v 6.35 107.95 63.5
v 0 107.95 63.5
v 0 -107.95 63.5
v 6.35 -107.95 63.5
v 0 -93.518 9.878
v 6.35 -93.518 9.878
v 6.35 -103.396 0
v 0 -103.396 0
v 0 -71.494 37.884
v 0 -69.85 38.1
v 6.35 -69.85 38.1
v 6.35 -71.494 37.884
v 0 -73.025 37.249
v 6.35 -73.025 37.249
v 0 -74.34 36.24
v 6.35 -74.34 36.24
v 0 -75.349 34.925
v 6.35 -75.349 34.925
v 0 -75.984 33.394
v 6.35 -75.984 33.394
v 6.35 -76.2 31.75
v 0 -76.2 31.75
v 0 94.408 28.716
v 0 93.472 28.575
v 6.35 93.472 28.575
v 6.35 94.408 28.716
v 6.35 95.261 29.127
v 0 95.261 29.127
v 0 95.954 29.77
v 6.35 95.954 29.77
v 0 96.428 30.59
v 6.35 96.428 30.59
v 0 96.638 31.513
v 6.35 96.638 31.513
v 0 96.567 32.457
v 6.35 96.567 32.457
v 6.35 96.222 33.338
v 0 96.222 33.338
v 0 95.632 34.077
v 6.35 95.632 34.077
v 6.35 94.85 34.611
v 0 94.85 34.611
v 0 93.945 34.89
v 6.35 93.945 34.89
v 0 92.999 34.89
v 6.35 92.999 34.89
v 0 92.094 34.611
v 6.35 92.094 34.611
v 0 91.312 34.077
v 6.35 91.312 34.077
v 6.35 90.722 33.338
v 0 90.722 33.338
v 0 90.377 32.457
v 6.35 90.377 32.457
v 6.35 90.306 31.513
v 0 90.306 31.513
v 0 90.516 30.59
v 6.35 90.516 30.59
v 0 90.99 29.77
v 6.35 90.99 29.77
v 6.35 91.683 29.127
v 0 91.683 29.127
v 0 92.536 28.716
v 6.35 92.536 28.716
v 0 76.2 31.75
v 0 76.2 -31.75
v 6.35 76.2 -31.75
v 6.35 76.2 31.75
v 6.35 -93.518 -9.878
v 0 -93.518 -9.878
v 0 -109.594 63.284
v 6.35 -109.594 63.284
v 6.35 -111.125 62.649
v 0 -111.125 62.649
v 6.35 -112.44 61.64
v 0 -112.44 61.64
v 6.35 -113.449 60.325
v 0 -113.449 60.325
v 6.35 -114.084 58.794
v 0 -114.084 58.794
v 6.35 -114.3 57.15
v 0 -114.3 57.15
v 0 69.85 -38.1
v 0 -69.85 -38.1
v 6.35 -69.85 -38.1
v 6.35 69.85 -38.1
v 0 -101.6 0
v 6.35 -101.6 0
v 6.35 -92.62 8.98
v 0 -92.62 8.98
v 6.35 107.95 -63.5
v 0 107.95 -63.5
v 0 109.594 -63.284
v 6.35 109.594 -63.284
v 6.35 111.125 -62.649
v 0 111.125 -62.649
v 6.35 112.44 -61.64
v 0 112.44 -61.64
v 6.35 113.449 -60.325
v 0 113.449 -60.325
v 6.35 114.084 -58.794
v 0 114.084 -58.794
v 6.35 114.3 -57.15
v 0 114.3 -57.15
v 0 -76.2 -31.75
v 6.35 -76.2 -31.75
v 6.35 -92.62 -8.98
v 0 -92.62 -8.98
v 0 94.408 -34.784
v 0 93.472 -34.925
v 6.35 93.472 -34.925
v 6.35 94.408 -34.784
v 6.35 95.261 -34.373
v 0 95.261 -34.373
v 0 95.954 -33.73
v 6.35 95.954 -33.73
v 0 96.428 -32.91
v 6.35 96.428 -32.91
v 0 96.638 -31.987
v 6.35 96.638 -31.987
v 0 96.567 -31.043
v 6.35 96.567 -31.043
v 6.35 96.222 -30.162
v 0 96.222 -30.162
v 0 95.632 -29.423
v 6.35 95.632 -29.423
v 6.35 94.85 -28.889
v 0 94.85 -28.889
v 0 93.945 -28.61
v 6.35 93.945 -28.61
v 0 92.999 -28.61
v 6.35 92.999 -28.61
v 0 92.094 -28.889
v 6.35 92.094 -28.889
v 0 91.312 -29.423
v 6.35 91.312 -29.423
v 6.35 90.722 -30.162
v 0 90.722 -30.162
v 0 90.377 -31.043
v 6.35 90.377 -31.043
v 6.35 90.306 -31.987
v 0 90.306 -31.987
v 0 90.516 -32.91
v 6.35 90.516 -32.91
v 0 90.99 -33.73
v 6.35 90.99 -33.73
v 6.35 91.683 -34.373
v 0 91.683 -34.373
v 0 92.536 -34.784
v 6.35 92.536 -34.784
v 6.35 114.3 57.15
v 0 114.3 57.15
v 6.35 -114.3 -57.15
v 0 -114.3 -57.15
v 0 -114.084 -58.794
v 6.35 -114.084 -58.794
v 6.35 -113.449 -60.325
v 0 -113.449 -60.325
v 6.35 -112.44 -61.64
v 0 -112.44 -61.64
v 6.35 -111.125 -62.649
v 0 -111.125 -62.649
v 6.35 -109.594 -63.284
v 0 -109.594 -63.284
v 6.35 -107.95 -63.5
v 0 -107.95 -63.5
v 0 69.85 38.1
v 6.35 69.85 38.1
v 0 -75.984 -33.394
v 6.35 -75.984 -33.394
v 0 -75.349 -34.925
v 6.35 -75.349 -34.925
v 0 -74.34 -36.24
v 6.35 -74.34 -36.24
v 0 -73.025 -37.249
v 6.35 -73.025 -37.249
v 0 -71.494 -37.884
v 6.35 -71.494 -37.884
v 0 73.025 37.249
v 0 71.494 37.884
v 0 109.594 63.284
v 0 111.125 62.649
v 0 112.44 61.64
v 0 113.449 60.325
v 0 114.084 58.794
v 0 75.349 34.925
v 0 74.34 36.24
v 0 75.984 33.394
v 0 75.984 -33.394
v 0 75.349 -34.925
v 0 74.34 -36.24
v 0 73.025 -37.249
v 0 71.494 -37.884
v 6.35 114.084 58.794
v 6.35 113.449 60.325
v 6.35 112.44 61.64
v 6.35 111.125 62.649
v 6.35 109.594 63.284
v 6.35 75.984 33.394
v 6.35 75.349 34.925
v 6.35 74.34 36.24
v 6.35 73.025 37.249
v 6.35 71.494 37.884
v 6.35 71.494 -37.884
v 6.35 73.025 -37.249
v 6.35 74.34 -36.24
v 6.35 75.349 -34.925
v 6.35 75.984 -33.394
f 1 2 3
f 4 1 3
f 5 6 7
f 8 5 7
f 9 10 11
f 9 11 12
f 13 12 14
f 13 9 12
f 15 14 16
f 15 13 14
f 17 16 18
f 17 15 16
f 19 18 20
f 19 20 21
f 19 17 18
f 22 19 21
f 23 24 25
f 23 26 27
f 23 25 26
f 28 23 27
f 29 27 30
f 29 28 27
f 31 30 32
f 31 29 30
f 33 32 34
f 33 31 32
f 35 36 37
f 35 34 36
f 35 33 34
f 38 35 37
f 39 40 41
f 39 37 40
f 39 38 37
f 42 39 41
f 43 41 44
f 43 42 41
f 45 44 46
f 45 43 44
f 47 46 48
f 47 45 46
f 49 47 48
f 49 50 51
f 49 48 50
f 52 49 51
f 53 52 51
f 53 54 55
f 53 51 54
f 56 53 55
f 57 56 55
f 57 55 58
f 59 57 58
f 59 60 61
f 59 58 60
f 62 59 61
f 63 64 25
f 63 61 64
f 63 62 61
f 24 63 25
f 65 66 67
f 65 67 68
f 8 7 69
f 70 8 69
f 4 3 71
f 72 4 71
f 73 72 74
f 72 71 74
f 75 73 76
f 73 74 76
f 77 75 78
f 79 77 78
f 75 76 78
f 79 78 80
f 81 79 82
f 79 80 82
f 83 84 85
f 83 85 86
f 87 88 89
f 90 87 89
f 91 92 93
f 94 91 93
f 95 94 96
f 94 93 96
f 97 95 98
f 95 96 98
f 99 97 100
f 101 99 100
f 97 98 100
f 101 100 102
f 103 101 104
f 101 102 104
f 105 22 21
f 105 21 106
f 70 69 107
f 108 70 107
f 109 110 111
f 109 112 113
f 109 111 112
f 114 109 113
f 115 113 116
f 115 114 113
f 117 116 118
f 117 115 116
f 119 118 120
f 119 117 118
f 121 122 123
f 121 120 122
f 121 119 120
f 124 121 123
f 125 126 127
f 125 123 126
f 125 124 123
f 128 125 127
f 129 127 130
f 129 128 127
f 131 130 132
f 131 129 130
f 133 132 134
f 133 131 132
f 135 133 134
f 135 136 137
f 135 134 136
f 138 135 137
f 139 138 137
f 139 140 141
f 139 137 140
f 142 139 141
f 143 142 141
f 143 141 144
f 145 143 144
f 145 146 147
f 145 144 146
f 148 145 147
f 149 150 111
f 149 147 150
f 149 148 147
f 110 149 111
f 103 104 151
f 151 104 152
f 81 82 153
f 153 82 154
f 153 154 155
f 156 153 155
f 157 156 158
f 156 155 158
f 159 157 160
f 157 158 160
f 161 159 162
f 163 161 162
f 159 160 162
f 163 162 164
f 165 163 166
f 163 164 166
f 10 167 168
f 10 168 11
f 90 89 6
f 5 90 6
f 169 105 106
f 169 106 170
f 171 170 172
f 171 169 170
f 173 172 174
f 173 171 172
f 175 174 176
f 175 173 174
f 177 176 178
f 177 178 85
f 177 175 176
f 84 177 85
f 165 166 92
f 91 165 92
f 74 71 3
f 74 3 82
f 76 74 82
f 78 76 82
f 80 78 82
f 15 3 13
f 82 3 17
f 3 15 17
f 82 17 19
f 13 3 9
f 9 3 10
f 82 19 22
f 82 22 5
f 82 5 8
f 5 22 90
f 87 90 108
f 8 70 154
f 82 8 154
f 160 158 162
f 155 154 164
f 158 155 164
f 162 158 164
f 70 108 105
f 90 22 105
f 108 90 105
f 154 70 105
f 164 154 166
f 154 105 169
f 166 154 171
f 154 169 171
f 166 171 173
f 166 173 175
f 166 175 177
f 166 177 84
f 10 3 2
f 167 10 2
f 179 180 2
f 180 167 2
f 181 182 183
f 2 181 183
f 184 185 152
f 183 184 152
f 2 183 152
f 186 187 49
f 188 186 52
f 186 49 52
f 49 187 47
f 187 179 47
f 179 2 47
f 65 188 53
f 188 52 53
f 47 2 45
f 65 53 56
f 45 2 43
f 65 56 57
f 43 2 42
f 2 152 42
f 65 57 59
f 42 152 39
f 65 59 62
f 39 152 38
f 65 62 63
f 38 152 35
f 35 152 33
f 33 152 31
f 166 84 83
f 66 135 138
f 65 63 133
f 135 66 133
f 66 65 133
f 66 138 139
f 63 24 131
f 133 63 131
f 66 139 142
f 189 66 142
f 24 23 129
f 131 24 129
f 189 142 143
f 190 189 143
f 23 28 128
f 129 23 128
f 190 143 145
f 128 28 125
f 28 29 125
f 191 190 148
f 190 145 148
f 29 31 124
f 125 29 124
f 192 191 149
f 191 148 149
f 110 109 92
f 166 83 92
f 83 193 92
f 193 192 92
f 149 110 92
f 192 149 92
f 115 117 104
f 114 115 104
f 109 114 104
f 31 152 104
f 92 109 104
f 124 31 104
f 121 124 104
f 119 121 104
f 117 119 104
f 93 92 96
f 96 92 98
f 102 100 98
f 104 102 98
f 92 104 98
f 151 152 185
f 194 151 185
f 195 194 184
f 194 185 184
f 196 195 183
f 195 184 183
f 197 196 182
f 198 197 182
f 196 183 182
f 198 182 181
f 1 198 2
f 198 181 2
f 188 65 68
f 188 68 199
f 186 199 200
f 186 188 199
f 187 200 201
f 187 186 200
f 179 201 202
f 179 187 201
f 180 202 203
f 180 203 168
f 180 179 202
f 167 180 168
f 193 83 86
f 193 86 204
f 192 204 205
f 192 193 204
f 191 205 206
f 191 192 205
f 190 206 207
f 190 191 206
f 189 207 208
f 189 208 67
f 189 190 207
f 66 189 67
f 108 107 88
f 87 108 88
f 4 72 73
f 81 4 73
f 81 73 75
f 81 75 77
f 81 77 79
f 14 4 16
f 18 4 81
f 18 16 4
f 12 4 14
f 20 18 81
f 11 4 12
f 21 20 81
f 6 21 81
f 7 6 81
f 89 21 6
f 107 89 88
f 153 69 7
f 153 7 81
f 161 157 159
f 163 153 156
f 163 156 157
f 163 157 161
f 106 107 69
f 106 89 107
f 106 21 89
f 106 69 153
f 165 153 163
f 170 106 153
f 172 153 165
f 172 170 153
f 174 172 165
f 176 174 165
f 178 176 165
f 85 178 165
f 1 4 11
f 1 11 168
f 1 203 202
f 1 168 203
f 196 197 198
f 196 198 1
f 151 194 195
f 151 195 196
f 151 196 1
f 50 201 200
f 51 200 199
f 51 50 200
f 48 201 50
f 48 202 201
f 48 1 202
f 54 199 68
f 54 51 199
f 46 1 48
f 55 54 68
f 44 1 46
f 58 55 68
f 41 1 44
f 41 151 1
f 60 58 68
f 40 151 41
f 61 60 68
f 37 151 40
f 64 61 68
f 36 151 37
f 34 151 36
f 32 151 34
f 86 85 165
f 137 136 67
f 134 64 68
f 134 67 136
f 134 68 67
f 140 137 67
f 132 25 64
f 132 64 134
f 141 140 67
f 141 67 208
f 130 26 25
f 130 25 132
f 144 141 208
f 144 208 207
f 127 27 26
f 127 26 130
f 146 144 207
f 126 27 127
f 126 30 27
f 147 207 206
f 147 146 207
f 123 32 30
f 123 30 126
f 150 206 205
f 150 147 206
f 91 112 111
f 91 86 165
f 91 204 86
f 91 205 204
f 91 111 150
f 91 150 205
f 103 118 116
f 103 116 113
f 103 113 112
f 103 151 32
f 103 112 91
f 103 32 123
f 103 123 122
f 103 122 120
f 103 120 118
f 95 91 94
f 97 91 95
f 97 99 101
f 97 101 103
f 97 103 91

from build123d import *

# Parameters (mm, degrees)
BOSS_EXTRUDE2_DEPTH     = 6.35
CUT_EXTRUDE1_REACH      = 132.909
CUT_EXTRUDE2_DEPTH      = 131.908603613
CUT_EXTRUDE2_DEPTH_BACK = 131.908603613
SKETCH5_R               = 3.175


with BuildPart() as part:
    # Sketch3 → Boss-Extrude2 (new body)
    with BuildSketch(Plane(origin=(0, 0, 0), x_dir=(0, 0, -1), z_dir=(1, 0, 0))):
        with BuildLine():
            Line((-57.15, -114.3), (57.15, -114.3))
            ThreePointArc((57.15, -114.3), (61.640128061, -112.440128061), (63.5, -107.95))
            Line((63.5, -107.95), (63.5, 107.95))
            ThreePointArc((63.5, 107.95), (61.640128061, 112.440128061), (57.15, 114.3))
            Line((57.15, 114.3), (-57.15, 114.3))
            ThreePointArc((-57.15, 114.3), (-61.640128061, 112.440128061), (-63.5, 107.95))
            Line((-63.5, 107.95), (-63.5, -107.95))
            ThreePointArc((-63.5, -107.95), (-61.640128061, -112.440128061), (-57.15, -114.3))
        make_face()
        with BuildLine():
            Line((-31.75, -76.2), (31.75, -76.2))
            ThreePointArc((31.75, -76.2), (36.240128061, -74.340128061), (38.1, -69.85))
            Line((38.1, -69.85), (38.1, 69.85))
            ThreePointArc((38.1, 69.85), (36.240128061, 74.340128061), (31.75, 76.2))
            Line((31.75, 76.2), (-31.75, 76.2))
            ThreePointArc((-31.75, 76.2), (-36.240128061, 74.340128061), (-38.1, 69.85))
            Line((-38.1, 69.85), (-38.1, -69.85))
            ThreePointArc((-38.1, -69.85), (-36.240128061, -74.340128061), (-31.75, -76.2))
        make_face(mode=Mode.SUBTRACT)
    extrude(amount=BOSS_EXTRUDE2_DEPTH)

    # Sketch4 → Cut-Extrude1 (cut, up to next)
    with BuildSketch(Plane(origin=(6.35, 0, 0), x_dir=(0, 0, -1), z_dir=(1, 0, 0)), mode=Mode.PRIVATE) as cut_extrude1_sk1:
        Polygon((0, -101.6), (-8.980256121, -92.619743879), (-9.878281733, -93.517769491), (0, -103.396051224), (9.878281733, -93.517769491), (8.980256121, -92.619743879), align=None)
    cut_extrude1_tool1 = extrude(cut_extrude1_sk1.sketch, amount=-CUT_EXTRUDE1_REACH, mode=Mode.PRIVATE) & part.part
    add(cut_extrude1_tool1.solids().sort_by_distance((6.35, -97.269002, 4.649259))[0], mode=Mode.SUBTRACT)

    # Sketch5 → Cut-Extrude2 (cut, two sides: drawn at the far end of the back side and taken through both)
    with BuildSketch(Plane(origin=(6.35, 0, 0), x_dir=(0, 0, -1), z_dir=(1, 0, 0)).offset(-CUT_EXTRUDE2_DEPTH_BACK)):
        with Locations((-31.75, 93.472)):
            Circle(SKETCH5_R)
        with Locations((31.75, 93.472)):
            Circle(SKETCH5_R)
    extrude(amount=CUT_EXTRUDE2_DEPTH + CUT_EXTRUDE2_DEPTH_BACK, mode=Mode.SUBTRACT)


solid = part.part
